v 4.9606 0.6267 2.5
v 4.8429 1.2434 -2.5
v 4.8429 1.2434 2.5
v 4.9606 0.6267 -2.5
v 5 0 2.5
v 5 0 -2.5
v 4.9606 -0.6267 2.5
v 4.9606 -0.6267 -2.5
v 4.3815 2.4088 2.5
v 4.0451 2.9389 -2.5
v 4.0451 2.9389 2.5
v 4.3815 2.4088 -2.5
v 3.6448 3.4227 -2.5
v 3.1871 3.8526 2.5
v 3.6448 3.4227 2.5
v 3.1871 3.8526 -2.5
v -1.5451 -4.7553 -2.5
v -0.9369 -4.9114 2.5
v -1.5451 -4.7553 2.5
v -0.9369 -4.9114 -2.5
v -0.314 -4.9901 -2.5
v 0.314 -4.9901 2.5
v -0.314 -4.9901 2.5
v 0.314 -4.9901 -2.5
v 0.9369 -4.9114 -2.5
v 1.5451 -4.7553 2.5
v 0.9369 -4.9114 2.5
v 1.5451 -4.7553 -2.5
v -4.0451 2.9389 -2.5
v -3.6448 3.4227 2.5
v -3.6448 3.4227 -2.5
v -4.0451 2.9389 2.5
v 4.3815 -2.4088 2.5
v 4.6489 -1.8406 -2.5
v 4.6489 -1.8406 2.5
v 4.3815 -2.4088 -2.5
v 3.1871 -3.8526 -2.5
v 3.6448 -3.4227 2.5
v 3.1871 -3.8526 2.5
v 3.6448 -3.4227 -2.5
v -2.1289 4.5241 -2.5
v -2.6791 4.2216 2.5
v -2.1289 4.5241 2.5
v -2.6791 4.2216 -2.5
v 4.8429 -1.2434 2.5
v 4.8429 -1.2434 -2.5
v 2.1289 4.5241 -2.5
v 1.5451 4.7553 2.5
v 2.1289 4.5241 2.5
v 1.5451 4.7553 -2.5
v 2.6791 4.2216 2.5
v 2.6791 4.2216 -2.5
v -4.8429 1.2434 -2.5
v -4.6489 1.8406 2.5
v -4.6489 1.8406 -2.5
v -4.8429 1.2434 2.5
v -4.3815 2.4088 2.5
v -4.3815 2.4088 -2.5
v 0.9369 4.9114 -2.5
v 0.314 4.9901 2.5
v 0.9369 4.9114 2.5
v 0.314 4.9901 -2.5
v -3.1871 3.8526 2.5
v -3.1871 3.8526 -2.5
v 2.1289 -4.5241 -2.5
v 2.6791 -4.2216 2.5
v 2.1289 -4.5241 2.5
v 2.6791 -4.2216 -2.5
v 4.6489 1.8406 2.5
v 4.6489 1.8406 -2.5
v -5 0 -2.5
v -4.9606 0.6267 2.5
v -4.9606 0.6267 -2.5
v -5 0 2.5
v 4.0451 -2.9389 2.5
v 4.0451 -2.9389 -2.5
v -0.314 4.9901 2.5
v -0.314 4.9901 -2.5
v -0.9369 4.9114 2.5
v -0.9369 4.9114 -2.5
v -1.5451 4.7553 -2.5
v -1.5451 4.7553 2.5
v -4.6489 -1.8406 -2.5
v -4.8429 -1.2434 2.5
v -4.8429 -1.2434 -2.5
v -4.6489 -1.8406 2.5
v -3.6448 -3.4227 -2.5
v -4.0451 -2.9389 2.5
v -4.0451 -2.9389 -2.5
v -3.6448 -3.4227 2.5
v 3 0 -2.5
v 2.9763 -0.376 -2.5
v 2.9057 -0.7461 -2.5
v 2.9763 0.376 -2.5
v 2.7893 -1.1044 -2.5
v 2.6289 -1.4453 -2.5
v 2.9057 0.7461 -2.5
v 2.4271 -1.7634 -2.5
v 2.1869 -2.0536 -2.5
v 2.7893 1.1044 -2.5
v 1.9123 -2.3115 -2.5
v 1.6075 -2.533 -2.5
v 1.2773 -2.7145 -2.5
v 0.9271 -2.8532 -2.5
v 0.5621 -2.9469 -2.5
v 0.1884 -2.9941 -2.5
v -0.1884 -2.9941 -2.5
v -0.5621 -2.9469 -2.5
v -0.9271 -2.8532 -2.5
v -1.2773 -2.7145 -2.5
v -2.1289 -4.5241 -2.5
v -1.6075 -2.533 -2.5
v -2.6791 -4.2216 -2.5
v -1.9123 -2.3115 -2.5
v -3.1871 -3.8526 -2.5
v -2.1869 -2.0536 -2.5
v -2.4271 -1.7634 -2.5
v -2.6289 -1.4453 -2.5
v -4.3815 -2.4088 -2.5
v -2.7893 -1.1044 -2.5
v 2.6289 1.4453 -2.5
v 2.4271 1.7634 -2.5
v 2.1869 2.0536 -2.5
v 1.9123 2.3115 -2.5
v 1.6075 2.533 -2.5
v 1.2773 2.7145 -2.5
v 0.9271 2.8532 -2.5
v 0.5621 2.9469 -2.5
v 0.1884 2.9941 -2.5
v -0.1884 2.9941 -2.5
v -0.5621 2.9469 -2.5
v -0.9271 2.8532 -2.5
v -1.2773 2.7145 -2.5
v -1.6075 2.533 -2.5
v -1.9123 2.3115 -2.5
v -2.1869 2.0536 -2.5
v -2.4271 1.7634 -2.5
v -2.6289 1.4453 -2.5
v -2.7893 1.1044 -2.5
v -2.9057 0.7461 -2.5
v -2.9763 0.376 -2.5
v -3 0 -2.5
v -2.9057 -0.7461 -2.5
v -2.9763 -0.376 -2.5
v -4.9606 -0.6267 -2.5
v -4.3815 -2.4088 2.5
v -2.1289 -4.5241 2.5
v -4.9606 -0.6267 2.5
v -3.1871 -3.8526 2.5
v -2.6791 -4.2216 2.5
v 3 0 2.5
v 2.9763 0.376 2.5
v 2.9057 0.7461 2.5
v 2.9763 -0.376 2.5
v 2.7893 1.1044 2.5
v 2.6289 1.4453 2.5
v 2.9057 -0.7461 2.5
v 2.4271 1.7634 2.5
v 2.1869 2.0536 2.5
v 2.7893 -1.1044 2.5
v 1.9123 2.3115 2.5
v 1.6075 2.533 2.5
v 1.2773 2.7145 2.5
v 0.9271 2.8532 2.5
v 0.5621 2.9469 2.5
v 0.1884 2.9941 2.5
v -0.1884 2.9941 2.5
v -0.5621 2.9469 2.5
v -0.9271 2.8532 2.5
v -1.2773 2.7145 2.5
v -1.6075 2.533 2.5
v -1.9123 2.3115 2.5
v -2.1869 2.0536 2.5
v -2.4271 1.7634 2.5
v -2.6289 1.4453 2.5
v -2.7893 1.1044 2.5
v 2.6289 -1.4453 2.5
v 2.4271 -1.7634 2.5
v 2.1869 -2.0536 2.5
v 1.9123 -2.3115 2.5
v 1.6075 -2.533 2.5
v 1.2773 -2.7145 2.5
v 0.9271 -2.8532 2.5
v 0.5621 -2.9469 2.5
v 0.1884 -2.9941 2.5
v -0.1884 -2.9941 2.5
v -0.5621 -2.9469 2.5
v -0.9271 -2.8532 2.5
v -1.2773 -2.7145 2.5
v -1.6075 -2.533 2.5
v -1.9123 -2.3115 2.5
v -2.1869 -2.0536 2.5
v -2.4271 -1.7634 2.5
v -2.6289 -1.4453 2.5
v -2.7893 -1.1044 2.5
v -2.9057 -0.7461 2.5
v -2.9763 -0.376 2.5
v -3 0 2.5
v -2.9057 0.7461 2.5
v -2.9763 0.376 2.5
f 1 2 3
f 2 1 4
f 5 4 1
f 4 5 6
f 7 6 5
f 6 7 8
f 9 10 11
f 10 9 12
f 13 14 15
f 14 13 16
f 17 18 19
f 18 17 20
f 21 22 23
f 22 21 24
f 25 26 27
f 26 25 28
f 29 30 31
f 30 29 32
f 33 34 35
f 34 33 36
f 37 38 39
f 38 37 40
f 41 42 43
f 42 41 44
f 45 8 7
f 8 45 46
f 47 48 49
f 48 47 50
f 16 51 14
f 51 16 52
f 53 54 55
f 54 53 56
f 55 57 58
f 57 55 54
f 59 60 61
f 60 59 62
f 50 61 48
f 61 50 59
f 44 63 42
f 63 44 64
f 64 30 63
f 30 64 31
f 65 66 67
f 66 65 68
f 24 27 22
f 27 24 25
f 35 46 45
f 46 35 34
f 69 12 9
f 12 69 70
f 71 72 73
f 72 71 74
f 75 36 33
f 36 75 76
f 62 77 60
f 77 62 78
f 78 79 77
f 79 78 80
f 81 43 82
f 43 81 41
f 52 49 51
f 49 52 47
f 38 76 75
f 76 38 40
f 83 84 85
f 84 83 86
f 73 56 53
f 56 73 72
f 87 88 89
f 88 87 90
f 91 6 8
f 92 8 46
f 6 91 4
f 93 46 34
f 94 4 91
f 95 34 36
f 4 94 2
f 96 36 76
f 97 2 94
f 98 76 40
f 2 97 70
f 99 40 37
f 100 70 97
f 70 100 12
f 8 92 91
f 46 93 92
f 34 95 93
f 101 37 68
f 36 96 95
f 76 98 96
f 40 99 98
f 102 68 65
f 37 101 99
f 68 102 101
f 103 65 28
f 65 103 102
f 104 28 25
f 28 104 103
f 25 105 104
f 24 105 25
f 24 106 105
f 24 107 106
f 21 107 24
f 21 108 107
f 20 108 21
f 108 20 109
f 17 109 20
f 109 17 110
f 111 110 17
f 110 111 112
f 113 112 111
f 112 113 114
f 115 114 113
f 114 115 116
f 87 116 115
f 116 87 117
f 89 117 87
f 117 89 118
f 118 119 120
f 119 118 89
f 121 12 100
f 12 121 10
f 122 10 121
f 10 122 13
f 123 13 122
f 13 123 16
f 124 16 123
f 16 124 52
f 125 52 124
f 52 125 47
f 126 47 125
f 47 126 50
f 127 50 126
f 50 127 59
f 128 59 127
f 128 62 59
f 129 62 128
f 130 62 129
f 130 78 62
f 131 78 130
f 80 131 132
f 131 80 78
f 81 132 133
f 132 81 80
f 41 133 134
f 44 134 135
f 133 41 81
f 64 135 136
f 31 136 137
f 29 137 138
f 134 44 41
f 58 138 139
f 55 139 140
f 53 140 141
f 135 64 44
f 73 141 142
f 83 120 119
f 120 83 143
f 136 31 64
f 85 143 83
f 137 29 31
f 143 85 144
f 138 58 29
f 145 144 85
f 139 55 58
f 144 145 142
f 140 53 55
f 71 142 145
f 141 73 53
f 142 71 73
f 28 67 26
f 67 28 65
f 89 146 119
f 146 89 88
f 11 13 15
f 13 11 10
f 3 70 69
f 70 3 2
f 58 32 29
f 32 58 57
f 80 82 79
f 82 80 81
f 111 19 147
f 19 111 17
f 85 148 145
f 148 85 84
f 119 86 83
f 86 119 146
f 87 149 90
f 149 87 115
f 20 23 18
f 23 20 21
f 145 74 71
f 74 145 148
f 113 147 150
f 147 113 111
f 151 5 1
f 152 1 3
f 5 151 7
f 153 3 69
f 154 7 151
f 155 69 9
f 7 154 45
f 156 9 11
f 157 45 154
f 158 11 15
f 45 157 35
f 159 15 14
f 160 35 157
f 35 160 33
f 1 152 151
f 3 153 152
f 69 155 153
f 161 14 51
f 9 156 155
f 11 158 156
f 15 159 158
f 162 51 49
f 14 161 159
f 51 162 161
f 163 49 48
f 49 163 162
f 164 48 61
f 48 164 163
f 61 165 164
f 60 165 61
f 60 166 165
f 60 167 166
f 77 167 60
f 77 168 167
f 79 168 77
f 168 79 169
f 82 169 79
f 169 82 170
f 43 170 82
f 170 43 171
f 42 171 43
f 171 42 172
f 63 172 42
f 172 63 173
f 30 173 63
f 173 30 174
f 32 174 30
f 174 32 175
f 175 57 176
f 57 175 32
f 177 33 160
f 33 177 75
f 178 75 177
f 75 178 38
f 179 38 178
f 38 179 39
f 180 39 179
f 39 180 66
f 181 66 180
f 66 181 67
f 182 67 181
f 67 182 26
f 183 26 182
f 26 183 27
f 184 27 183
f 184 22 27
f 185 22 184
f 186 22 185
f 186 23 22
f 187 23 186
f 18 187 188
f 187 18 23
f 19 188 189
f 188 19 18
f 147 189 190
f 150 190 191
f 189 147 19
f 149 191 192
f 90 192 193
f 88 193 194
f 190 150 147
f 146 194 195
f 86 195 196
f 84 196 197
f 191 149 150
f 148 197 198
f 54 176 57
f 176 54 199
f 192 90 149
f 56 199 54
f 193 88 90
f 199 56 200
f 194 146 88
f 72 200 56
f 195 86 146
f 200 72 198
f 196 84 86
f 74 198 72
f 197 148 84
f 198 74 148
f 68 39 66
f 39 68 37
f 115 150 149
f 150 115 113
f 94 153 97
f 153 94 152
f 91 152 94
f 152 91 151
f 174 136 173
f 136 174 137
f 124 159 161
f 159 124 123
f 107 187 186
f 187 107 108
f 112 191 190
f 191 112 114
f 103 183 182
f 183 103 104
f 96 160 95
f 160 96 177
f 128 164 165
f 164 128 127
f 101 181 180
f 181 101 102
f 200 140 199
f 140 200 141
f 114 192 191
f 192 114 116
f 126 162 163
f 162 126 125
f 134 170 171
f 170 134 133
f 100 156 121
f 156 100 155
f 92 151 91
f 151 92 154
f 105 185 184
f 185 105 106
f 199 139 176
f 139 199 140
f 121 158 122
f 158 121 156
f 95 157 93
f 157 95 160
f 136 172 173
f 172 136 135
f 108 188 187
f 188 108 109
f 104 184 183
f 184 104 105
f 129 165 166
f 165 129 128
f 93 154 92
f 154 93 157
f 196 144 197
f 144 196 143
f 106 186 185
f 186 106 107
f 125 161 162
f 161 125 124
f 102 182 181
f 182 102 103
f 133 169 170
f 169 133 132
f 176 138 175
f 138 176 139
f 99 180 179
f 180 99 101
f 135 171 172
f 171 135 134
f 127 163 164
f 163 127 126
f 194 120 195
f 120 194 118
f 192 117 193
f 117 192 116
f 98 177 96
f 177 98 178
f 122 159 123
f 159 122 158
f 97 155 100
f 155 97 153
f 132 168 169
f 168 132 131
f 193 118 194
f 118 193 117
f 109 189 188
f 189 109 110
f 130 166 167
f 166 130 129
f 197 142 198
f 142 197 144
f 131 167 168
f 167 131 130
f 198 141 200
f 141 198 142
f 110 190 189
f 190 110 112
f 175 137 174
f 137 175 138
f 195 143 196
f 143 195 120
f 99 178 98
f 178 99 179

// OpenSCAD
$fn = 50;


difference() {
	union() {
		translate(v = [0, 0, -2.5000000000]) {
			cylinder(h = 5, r = 5.0000000000);
		}
	}
	union() {
		translate(v = [0, 0, -100.0000000000]) {
			cylinder(h = 200, r = 3.0000000000);
		}
	}
}
